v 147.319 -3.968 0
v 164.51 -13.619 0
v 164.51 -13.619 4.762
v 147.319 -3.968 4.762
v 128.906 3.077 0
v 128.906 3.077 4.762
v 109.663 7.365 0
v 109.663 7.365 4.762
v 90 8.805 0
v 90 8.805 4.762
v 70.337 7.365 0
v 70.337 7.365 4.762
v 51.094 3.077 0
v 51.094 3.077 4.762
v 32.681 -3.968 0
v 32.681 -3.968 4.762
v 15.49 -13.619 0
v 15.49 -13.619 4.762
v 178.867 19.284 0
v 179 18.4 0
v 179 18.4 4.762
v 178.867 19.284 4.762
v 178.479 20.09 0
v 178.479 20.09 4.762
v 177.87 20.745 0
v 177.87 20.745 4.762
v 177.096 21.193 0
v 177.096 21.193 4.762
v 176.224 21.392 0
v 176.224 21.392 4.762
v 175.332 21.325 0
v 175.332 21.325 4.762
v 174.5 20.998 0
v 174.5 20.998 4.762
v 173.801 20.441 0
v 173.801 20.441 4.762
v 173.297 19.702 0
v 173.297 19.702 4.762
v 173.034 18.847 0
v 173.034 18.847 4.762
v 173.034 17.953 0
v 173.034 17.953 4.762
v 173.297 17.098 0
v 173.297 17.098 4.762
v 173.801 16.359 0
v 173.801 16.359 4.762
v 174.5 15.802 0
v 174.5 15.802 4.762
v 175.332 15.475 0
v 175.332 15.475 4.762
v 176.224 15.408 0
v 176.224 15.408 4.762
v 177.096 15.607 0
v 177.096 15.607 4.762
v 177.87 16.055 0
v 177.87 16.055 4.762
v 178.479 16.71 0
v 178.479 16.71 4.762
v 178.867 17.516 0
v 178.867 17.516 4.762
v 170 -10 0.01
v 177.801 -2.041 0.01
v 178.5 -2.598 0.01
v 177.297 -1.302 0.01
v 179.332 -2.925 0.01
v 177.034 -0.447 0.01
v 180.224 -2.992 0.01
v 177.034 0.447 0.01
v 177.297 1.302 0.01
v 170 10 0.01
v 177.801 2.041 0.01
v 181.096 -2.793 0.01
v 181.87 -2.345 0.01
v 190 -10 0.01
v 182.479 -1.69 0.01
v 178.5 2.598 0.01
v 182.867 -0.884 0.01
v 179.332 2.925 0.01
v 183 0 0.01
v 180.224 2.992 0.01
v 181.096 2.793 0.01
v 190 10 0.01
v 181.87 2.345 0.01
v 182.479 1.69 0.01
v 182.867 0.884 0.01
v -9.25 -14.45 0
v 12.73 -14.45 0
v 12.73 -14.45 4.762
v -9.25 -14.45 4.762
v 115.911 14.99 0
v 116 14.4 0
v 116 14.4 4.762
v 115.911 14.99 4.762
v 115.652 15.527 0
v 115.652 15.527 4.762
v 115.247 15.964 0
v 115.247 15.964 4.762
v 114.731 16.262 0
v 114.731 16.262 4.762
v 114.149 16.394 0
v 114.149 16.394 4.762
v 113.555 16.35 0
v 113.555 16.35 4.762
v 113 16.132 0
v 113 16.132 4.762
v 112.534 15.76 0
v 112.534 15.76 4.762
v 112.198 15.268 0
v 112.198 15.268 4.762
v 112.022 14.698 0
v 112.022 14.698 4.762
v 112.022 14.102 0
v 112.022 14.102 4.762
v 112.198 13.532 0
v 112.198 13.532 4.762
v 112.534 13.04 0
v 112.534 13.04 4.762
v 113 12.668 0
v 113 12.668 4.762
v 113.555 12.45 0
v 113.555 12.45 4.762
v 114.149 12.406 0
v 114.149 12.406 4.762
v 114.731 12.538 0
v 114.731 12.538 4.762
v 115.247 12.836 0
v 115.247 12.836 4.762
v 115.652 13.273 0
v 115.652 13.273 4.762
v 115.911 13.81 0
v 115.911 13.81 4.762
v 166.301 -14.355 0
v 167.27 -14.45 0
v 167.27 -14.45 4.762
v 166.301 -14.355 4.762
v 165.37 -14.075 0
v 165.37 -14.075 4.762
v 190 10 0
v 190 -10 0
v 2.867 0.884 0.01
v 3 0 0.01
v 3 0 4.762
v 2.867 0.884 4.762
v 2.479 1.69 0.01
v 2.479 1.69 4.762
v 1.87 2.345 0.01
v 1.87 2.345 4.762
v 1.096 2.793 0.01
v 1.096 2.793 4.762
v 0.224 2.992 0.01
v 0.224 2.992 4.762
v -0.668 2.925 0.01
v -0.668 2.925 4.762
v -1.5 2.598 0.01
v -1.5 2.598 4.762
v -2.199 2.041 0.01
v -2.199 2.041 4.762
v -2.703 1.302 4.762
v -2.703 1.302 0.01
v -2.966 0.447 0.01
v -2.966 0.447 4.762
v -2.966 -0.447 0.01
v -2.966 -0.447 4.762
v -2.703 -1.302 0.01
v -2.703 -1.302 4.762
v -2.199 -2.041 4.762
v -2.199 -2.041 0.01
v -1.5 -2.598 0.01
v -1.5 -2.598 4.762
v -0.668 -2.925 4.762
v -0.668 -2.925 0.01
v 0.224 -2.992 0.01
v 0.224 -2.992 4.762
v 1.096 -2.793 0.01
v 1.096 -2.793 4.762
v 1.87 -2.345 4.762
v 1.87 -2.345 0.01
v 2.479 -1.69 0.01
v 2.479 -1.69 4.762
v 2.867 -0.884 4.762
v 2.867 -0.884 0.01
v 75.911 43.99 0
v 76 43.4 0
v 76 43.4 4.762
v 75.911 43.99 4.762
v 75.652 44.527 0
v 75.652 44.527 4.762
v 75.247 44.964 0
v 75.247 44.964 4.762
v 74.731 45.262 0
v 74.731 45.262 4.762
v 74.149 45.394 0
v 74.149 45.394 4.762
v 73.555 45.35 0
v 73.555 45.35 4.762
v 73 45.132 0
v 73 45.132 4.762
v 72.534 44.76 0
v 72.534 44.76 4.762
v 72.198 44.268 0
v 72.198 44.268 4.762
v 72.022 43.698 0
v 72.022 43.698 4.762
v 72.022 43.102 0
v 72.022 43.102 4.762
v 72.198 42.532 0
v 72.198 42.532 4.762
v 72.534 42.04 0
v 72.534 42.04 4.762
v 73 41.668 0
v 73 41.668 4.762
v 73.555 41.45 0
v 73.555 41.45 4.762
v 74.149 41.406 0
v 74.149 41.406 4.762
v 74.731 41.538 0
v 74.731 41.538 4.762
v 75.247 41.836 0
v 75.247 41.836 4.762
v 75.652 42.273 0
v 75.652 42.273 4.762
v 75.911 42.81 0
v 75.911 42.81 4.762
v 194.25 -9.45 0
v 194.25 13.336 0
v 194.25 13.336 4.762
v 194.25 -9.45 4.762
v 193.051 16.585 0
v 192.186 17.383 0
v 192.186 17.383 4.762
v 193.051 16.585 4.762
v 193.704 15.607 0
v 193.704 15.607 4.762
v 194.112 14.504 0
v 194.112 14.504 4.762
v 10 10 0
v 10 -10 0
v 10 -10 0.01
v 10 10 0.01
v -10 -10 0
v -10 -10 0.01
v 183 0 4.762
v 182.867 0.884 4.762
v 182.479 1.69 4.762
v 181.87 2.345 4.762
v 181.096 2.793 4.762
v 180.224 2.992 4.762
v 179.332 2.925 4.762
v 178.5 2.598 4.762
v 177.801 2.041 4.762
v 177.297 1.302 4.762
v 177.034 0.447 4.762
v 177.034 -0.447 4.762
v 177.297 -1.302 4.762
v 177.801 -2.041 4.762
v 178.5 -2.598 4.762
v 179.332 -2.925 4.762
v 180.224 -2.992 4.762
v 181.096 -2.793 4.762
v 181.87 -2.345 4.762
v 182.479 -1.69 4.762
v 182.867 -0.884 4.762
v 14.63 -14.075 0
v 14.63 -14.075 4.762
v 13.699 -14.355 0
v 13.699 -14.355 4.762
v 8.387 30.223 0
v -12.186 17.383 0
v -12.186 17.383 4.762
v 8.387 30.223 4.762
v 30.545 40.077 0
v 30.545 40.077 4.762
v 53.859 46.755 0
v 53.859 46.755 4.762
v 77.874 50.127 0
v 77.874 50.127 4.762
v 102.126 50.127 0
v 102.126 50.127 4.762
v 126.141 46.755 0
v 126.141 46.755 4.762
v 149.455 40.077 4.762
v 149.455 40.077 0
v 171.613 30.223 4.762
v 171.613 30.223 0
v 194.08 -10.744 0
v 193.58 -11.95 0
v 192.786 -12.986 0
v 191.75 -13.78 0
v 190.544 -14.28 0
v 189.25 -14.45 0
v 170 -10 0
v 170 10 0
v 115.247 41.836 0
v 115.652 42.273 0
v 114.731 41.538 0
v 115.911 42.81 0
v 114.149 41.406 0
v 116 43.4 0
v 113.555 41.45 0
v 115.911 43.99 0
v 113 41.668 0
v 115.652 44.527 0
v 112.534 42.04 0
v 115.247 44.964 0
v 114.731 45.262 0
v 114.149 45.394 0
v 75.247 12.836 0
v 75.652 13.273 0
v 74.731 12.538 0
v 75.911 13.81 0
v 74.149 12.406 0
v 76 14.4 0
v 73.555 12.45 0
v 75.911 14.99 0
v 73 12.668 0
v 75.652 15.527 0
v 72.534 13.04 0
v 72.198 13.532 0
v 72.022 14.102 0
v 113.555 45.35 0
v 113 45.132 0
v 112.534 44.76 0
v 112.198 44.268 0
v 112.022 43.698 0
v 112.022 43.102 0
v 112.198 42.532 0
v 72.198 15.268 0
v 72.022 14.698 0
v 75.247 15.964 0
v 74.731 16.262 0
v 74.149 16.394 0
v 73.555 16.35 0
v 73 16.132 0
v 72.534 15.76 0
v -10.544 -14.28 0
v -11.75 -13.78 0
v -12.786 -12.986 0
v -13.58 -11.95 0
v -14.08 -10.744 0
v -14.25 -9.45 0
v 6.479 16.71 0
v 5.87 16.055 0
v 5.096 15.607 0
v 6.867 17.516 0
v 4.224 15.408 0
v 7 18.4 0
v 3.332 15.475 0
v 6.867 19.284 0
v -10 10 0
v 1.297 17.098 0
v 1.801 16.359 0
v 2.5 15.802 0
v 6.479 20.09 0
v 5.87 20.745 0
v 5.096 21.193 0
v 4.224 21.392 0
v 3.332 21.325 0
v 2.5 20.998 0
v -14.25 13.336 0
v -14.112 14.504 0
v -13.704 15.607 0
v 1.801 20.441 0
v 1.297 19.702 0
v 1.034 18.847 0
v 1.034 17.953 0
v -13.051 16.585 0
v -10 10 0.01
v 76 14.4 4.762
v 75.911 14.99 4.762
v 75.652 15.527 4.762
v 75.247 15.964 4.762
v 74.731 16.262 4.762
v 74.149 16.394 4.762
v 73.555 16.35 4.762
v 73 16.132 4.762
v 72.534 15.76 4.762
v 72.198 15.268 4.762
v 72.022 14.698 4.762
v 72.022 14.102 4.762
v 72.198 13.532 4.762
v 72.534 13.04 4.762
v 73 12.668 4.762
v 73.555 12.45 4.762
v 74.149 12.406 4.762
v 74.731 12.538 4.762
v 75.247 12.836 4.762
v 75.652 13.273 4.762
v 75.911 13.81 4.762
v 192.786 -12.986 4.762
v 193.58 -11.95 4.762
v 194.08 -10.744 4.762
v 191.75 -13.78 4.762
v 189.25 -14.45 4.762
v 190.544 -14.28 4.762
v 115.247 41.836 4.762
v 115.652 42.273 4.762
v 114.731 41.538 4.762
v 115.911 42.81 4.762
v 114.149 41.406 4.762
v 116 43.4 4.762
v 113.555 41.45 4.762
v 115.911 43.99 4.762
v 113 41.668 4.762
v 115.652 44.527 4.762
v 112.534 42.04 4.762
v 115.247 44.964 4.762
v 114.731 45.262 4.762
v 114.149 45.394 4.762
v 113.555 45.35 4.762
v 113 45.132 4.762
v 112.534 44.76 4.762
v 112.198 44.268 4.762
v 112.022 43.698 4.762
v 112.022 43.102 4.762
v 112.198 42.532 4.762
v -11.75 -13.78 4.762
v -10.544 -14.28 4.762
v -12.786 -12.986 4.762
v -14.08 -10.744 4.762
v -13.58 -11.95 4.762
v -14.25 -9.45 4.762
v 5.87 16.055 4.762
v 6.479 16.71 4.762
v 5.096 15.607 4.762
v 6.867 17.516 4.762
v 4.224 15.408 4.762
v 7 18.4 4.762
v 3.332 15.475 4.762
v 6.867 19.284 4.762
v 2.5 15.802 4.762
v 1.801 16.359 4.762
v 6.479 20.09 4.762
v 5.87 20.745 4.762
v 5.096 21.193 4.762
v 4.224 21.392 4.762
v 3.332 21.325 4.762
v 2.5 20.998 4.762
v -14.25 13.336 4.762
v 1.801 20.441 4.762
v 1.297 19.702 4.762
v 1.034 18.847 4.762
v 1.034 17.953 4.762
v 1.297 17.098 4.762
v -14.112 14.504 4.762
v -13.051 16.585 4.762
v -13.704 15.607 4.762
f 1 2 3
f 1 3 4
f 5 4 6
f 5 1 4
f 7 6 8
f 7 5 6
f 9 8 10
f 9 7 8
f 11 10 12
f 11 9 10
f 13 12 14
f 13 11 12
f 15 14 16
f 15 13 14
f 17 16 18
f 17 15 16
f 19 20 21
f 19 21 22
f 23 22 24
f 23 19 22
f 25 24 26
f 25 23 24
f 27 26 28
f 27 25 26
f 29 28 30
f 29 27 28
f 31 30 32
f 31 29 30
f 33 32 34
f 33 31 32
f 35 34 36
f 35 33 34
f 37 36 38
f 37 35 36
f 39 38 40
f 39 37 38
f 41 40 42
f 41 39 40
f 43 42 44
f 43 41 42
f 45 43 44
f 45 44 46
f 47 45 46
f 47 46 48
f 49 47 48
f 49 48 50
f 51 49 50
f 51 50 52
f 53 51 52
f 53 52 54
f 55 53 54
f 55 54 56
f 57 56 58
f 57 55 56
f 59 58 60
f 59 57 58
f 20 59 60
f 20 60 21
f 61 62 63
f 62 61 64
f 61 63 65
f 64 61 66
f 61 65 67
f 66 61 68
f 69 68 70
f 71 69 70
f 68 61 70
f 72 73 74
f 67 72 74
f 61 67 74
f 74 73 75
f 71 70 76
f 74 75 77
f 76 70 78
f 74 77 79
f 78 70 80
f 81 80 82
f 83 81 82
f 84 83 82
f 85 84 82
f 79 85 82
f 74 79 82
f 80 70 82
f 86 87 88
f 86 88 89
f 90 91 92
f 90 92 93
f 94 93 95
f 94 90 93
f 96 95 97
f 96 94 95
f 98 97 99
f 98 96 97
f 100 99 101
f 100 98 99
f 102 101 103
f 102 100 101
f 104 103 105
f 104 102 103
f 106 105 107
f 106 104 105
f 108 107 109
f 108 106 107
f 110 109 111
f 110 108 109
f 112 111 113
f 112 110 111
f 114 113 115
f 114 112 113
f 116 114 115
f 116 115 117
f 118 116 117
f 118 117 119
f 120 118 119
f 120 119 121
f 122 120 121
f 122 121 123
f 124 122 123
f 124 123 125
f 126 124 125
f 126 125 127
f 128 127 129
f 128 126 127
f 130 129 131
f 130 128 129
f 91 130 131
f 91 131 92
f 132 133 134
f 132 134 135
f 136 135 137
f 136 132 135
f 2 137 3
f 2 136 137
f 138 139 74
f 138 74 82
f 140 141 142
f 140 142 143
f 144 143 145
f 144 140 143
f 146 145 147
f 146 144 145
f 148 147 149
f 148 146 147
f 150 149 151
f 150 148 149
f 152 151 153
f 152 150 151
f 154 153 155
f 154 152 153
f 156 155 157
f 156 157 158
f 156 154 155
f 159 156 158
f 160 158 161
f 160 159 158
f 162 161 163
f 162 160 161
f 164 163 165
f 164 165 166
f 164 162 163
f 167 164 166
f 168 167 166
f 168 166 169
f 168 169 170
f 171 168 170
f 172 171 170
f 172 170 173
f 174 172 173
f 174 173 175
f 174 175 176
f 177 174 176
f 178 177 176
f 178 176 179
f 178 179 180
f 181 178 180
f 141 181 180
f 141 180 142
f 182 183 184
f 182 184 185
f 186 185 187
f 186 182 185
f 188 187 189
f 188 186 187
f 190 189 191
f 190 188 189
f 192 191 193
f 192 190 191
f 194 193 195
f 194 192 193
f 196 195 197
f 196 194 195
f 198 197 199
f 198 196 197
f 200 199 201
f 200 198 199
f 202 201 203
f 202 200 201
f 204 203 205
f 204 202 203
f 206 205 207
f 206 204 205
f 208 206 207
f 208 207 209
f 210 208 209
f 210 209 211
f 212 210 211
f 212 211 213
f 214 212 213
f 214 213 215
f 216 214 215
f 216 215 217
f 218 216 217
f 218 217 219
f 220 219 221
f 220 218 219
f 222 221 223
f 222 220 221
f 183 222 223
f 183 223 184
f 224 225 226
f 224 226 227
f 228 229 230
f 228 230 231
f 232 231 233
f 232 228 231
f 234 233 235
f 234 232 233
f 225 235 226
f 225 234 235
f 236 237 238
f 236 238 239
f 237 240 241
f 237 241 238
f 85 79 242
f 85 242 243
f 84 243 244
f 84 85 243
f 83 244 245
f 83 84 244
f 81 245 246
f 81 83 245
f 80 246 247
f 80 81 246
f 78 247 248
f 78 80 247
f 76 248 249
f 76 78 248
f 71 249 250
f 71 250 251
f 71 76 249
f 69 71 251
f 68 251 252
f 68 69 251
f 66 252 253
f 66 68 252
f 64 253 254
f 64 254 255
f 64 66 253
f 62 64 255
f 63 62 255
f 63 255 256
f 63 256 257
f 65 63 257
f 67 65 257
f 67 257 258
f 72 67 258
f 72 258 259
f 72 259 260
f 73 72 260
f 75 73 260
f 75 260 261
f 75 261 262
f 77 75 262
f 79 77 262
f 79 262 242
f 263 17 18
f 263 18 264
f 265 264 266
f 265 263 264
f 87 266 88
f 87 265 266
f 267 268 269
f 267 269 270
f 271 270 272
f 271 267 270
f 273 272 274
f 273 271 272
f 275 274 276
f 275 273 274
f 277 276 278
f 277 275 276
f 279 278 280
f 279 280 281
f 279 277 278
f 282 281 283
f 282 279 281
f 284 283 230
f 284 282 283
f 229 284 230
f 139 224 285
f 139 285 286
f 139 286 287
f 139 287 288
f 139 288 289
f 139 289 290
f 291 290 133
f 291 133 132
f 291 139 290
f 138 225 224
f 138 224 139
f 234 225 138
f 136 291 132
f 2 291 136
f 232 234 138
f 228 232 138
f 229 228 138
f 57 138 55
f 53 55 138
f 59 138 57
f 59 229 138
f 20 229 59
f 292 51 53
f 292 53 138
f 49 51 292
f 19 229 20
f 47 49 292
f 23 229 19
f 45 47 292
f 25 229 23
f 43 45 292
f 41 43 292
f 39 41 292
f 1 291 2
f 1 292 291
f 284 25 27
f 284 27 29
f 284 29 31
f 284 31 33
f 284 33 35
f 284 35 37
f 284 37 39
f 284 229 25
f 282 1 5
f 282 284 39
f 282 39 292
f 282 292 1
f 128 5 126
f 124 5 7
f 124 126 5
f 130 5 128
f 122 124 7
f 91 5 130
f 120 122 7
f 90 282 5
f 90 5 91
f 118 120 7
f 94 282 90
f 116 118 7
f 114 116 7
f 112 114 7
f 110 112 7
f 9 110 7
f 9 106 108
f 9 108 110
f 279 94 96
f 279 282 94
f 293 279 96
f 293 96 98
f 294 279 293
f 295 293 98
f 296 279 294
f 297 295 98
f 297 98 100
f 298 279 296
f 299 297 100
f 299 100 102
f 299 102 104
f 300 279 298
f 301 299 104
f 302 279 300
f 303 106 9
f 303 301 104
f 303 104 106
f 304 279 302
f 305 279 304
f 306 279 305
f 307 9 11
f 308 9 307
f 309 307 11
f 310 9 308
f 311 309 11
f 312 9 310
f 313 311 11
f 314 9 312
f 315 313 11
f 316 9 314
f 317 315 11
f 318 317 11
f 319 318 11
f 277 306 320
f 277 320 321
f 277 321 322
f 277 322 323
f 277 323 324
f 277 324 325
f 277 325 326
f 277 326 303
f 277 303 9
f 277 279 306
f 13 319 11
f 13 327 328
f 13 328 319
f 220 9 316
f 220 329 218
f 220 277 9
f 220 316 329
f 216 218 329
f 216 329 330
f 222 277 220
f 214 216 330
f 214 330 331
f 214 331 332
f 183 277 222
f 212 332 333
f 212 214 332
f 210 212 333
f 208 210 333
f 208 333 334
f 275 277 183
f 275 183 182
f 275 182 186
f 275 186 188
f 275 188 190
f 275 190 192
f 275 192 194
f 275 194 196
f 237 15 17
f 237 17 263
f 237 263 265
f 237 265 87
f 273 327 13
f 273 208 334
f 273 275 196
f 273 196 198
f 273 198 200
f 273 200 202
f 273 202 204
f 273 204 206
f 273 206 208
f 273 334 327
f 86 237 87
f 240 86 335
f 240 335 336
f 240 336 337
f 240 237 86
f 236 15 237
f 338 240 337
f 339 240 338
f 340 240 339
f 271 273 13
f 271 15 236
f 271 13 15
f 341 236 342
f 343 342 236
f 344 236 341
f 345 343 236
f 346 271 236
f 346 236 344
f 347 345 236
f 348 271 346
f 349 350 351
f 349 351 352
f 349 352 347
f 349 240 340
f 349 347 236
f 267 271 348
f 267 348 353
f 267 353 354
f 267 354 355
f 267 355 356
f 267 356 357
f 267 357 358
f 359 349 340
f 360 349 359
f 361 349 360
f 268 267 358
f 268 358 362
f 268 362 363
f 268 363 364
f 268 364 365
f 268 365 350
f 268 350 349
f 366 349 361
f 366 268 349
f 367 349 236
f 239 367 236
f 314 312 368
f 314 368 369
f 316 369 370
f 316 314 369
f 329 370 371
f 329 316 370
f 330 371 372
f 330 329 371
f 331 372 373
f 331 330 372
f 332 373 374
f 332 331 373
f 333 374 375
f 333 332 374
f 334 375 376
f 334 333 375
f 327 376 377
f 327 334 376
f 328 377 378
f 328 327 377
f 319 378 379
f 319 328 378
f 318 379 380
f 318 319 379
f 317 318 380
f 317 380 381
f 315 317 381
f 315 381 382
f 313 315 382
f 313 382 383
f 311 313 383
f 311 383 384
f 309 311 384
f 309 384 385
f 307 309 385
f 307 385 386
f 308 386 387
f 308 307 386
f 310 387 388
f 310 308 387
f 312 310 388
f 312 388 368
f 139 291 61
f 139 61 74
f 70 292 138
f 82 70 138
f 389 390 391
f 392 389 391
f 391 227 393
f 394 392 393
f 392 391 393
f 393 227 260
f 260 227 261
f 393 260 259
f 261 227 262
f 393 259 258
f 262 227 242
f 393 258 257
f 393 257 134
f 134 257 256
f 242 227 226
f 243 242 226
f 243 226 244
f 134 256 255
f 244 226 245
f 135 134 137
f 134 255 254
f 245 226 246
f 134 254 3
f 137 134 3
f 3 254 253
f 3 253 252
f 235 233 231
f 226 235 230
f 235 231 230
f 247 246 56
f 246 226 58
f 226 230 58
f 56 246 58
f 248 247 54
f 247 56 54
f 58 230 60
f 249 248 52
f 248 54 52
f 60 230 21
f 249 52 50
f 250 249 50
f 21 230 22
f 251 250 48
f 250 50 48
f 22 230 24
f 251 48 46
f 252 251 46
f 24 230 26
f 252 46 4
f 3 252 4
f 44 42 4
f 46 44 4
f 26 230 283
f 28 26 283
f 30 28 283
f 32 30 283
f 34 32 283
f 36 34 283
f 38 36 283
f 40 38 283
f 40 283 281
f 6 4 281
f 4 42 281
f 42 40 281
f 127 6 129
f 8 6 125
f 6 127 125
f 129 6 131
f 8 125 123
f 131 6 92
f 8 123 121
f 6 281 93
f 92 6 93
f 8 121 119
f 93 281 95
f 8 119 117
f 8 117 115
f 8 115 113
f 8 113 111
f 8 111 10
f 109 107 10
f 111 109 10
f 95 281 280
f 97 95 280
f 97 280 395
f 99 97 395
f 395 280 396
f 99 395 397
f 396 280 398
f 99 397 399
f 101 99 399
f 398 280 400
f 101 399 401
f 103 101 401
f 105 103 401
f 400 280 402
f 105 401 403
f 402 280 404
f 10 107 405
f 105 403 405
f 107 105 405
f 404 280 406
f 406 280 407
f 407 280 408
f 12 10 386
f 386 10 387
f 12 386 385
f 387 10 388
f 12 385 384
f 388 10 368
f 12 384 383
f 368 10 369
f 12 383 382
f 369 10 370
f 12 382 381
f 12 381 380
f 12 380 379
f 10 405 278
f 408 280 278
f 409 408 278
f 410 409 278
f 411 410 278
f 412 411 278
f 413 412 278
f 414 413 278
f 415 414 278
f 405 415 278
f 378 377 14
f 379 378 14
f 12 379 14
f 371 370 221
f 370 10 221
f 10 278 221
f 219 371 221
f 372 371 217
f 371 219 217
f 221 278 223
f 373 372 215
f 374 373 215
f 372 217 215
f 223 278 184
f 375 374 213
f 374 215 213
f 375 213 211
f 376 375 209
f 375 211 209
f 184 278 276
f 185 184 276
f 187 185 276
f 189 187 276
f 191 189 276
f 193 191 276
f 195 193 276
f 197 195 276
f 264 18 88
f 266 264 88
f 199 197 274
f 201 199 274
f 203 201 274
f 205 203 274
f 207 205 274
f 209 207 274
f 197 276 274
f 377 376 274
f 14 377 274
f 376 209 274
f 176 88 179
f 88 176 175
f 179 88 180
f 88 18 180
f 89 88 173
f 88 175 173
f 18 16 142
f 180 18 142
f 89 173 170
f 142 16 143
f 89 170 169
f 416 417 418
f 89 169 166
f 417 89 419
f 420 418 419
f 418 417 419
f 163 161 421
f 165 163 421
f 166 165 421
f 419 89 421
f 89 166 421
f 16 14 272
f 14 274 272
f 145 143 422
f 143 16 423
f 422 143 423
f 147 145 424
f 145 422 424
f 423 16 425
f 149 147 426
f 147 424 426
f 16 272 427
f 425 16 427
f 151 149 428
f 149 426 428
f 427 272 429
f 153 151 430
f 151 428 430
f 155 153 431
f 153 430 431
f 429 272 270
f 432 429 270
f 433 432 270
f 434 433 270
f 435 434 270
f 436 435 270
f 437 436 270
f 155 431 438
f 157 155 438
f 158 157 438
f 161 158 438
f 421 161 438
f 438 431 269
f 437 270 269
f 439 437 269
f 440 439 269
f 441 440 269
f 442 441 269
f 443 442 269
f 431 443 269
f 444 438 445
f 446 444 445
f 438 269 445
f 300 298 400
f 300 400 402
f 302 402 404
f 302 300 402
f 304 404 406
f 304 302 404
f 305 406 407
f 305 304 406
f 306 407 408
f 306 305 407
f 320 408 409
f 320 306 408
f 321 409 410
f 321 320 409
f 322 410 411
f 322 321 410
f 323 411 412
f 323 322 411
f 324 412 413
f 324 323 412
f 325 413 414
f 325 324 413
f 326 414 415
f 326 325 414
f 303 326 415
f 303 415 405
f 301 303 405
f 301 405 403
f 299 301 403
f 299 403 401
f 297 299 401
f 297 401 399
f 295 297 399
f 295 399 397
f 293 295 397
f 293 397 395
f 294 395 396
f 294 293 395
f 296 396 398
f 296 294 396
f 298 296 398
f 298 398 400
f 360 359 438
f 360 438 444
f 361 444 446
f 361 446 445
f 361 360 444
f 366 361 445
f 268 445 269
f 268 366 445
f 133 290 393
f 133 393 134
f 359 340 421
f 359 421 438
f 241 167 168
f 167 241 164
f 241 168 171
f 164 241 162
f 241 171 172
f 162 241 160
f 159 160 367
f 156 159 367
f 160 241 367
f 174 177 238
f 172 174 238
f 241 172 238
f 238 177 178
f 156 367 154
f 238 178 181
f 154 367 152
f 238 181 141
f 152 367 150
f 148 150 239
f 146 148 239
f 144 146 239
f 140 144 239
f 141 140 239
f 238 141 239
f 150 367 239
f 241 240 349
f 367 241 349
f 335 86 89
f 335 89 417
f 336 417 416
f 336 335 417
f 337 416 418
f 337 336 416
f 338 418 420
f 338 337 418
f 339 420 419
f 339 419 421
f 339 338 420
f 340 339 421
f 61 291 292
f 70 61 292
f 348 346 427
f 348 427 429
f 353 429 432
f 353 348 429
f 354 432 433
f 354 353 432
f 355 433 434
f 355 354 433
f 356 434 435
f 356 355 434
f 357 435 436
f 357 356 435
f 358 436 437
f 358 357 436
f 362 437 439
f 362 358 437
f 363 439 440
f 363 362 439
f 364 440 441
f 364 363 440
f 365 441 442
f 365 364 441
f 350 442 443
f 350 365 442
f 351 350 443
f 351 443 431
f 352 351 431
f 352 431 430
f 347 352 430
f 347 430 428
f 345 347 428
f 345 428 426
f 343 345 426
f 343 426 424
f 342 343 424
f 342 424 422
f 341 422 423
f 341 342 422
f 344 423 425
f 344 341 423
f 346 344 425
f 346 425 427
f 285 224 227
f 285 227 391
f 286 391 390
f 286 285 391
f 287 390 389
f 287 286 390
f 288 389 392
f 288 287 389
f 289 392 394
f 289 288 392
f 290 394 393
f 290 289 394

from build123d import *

# Parameters (mm, degrees)
SKETCH1_R           = 2
SKETCH1_R_2         = 3
BOSS_EXTRUDE1_DEPTH = 4.7625
SKETCH4_W           = 20
SKETCH4_H           = 20
CUT_EXTRUDE2_DEPTH  = 0.01


with BuildPart() as part:
    # Sketch1 → Boss-Extrude1 (new body)
    with BuildSketch(Plane.XY):
        with BuildLine():
            Line((-14.25, -9.45), (-14.25, 13.336101268))
            ThreePointArc((-14.25, 13.336101268), (-13.704321085, 15.607449693), (-12.186390533, 17.383027341))
            ThreePointArc((-12.186390533, 17.383027341), (90, 50.55), (192.186390533, 17.383027341))
            ThreePointArc((192.186390533, 17.383027341), (193.704321085, 15.607449693), (194.25, 13.336101268))
            Line((194.25, 13.336101268), (194.25, -9.45))
            ThreePointArc((194.25, -9.45), (192.785533906, -12.985533906), (189.25, -14.45))
            Line((189.25, -14.45), (167.269740757, -14.45))
            ThreePointArc((167.269740757, -14.45), (165.828788887, -14.237865674), (164.510107159, -13.619463083))
            ThreePointArc((164.510107159, -13.619463083), (90, 8.80503367), (15.489892841, -13.619463083))
            ThreePointArc((15.489892841, -13.619463083), (14.171211113, -14.237865674), (12.730259243, -14.45))
            Line((12.730259243, -14.45), (-9.25, -14.45))
            ThreePointArc((-9.25, -14.45), (-12.785533906, -12.985533906), (-14.25, -9.45))
        make_face()
        with Locations((74, 43.4)):
            Circle(SKETCH1_R, mode=Mode.SUBTRACT)
        with Locations((74, 14.4)):
            Circle(SKETCH1_R, mode=Mode.SUBTRACT)
        with Locations((114, 43.4)):
            Circle(SKETCH1_R, mode=Mode.SUBTRACT)
        with Locations((114, 14.4)):
            Circle(SKETCH1_R, mode=Mode.SUBTRACT)
        with Locations((180, 0)):
            Circle(SKETCH1_R_2, mode=Mode.SUBTRACT)
        Circle(SKETCH1_R_2, mode=Mode.SUBTRACT)
        with Locations((4, 18.4)):
            Circle(SKETCH1_R_2, mode=Mode.SUBTRACT)
        with Locations((176, 18.4)):
            Circle(SKETCH1_R_2, mode=Mode.SUBTRACT)
    extrude(amount=BOSS_EXTRUDE1_DEPTH)

    # Sketch4 → Cut-Extrude2 (cut)
    with BuildSketch(Plane.XY):
        Rectangle(SKETCH4_W, SKETCH4_H)
        with Locations((180, 0)):
            Rectangle(SKETCH4_W, SKETCH4_H)
    extrude(amount=CUT_EXTRUDE2_DEPTH, mode=Mode.SUBTRACT)


solid = part.part
